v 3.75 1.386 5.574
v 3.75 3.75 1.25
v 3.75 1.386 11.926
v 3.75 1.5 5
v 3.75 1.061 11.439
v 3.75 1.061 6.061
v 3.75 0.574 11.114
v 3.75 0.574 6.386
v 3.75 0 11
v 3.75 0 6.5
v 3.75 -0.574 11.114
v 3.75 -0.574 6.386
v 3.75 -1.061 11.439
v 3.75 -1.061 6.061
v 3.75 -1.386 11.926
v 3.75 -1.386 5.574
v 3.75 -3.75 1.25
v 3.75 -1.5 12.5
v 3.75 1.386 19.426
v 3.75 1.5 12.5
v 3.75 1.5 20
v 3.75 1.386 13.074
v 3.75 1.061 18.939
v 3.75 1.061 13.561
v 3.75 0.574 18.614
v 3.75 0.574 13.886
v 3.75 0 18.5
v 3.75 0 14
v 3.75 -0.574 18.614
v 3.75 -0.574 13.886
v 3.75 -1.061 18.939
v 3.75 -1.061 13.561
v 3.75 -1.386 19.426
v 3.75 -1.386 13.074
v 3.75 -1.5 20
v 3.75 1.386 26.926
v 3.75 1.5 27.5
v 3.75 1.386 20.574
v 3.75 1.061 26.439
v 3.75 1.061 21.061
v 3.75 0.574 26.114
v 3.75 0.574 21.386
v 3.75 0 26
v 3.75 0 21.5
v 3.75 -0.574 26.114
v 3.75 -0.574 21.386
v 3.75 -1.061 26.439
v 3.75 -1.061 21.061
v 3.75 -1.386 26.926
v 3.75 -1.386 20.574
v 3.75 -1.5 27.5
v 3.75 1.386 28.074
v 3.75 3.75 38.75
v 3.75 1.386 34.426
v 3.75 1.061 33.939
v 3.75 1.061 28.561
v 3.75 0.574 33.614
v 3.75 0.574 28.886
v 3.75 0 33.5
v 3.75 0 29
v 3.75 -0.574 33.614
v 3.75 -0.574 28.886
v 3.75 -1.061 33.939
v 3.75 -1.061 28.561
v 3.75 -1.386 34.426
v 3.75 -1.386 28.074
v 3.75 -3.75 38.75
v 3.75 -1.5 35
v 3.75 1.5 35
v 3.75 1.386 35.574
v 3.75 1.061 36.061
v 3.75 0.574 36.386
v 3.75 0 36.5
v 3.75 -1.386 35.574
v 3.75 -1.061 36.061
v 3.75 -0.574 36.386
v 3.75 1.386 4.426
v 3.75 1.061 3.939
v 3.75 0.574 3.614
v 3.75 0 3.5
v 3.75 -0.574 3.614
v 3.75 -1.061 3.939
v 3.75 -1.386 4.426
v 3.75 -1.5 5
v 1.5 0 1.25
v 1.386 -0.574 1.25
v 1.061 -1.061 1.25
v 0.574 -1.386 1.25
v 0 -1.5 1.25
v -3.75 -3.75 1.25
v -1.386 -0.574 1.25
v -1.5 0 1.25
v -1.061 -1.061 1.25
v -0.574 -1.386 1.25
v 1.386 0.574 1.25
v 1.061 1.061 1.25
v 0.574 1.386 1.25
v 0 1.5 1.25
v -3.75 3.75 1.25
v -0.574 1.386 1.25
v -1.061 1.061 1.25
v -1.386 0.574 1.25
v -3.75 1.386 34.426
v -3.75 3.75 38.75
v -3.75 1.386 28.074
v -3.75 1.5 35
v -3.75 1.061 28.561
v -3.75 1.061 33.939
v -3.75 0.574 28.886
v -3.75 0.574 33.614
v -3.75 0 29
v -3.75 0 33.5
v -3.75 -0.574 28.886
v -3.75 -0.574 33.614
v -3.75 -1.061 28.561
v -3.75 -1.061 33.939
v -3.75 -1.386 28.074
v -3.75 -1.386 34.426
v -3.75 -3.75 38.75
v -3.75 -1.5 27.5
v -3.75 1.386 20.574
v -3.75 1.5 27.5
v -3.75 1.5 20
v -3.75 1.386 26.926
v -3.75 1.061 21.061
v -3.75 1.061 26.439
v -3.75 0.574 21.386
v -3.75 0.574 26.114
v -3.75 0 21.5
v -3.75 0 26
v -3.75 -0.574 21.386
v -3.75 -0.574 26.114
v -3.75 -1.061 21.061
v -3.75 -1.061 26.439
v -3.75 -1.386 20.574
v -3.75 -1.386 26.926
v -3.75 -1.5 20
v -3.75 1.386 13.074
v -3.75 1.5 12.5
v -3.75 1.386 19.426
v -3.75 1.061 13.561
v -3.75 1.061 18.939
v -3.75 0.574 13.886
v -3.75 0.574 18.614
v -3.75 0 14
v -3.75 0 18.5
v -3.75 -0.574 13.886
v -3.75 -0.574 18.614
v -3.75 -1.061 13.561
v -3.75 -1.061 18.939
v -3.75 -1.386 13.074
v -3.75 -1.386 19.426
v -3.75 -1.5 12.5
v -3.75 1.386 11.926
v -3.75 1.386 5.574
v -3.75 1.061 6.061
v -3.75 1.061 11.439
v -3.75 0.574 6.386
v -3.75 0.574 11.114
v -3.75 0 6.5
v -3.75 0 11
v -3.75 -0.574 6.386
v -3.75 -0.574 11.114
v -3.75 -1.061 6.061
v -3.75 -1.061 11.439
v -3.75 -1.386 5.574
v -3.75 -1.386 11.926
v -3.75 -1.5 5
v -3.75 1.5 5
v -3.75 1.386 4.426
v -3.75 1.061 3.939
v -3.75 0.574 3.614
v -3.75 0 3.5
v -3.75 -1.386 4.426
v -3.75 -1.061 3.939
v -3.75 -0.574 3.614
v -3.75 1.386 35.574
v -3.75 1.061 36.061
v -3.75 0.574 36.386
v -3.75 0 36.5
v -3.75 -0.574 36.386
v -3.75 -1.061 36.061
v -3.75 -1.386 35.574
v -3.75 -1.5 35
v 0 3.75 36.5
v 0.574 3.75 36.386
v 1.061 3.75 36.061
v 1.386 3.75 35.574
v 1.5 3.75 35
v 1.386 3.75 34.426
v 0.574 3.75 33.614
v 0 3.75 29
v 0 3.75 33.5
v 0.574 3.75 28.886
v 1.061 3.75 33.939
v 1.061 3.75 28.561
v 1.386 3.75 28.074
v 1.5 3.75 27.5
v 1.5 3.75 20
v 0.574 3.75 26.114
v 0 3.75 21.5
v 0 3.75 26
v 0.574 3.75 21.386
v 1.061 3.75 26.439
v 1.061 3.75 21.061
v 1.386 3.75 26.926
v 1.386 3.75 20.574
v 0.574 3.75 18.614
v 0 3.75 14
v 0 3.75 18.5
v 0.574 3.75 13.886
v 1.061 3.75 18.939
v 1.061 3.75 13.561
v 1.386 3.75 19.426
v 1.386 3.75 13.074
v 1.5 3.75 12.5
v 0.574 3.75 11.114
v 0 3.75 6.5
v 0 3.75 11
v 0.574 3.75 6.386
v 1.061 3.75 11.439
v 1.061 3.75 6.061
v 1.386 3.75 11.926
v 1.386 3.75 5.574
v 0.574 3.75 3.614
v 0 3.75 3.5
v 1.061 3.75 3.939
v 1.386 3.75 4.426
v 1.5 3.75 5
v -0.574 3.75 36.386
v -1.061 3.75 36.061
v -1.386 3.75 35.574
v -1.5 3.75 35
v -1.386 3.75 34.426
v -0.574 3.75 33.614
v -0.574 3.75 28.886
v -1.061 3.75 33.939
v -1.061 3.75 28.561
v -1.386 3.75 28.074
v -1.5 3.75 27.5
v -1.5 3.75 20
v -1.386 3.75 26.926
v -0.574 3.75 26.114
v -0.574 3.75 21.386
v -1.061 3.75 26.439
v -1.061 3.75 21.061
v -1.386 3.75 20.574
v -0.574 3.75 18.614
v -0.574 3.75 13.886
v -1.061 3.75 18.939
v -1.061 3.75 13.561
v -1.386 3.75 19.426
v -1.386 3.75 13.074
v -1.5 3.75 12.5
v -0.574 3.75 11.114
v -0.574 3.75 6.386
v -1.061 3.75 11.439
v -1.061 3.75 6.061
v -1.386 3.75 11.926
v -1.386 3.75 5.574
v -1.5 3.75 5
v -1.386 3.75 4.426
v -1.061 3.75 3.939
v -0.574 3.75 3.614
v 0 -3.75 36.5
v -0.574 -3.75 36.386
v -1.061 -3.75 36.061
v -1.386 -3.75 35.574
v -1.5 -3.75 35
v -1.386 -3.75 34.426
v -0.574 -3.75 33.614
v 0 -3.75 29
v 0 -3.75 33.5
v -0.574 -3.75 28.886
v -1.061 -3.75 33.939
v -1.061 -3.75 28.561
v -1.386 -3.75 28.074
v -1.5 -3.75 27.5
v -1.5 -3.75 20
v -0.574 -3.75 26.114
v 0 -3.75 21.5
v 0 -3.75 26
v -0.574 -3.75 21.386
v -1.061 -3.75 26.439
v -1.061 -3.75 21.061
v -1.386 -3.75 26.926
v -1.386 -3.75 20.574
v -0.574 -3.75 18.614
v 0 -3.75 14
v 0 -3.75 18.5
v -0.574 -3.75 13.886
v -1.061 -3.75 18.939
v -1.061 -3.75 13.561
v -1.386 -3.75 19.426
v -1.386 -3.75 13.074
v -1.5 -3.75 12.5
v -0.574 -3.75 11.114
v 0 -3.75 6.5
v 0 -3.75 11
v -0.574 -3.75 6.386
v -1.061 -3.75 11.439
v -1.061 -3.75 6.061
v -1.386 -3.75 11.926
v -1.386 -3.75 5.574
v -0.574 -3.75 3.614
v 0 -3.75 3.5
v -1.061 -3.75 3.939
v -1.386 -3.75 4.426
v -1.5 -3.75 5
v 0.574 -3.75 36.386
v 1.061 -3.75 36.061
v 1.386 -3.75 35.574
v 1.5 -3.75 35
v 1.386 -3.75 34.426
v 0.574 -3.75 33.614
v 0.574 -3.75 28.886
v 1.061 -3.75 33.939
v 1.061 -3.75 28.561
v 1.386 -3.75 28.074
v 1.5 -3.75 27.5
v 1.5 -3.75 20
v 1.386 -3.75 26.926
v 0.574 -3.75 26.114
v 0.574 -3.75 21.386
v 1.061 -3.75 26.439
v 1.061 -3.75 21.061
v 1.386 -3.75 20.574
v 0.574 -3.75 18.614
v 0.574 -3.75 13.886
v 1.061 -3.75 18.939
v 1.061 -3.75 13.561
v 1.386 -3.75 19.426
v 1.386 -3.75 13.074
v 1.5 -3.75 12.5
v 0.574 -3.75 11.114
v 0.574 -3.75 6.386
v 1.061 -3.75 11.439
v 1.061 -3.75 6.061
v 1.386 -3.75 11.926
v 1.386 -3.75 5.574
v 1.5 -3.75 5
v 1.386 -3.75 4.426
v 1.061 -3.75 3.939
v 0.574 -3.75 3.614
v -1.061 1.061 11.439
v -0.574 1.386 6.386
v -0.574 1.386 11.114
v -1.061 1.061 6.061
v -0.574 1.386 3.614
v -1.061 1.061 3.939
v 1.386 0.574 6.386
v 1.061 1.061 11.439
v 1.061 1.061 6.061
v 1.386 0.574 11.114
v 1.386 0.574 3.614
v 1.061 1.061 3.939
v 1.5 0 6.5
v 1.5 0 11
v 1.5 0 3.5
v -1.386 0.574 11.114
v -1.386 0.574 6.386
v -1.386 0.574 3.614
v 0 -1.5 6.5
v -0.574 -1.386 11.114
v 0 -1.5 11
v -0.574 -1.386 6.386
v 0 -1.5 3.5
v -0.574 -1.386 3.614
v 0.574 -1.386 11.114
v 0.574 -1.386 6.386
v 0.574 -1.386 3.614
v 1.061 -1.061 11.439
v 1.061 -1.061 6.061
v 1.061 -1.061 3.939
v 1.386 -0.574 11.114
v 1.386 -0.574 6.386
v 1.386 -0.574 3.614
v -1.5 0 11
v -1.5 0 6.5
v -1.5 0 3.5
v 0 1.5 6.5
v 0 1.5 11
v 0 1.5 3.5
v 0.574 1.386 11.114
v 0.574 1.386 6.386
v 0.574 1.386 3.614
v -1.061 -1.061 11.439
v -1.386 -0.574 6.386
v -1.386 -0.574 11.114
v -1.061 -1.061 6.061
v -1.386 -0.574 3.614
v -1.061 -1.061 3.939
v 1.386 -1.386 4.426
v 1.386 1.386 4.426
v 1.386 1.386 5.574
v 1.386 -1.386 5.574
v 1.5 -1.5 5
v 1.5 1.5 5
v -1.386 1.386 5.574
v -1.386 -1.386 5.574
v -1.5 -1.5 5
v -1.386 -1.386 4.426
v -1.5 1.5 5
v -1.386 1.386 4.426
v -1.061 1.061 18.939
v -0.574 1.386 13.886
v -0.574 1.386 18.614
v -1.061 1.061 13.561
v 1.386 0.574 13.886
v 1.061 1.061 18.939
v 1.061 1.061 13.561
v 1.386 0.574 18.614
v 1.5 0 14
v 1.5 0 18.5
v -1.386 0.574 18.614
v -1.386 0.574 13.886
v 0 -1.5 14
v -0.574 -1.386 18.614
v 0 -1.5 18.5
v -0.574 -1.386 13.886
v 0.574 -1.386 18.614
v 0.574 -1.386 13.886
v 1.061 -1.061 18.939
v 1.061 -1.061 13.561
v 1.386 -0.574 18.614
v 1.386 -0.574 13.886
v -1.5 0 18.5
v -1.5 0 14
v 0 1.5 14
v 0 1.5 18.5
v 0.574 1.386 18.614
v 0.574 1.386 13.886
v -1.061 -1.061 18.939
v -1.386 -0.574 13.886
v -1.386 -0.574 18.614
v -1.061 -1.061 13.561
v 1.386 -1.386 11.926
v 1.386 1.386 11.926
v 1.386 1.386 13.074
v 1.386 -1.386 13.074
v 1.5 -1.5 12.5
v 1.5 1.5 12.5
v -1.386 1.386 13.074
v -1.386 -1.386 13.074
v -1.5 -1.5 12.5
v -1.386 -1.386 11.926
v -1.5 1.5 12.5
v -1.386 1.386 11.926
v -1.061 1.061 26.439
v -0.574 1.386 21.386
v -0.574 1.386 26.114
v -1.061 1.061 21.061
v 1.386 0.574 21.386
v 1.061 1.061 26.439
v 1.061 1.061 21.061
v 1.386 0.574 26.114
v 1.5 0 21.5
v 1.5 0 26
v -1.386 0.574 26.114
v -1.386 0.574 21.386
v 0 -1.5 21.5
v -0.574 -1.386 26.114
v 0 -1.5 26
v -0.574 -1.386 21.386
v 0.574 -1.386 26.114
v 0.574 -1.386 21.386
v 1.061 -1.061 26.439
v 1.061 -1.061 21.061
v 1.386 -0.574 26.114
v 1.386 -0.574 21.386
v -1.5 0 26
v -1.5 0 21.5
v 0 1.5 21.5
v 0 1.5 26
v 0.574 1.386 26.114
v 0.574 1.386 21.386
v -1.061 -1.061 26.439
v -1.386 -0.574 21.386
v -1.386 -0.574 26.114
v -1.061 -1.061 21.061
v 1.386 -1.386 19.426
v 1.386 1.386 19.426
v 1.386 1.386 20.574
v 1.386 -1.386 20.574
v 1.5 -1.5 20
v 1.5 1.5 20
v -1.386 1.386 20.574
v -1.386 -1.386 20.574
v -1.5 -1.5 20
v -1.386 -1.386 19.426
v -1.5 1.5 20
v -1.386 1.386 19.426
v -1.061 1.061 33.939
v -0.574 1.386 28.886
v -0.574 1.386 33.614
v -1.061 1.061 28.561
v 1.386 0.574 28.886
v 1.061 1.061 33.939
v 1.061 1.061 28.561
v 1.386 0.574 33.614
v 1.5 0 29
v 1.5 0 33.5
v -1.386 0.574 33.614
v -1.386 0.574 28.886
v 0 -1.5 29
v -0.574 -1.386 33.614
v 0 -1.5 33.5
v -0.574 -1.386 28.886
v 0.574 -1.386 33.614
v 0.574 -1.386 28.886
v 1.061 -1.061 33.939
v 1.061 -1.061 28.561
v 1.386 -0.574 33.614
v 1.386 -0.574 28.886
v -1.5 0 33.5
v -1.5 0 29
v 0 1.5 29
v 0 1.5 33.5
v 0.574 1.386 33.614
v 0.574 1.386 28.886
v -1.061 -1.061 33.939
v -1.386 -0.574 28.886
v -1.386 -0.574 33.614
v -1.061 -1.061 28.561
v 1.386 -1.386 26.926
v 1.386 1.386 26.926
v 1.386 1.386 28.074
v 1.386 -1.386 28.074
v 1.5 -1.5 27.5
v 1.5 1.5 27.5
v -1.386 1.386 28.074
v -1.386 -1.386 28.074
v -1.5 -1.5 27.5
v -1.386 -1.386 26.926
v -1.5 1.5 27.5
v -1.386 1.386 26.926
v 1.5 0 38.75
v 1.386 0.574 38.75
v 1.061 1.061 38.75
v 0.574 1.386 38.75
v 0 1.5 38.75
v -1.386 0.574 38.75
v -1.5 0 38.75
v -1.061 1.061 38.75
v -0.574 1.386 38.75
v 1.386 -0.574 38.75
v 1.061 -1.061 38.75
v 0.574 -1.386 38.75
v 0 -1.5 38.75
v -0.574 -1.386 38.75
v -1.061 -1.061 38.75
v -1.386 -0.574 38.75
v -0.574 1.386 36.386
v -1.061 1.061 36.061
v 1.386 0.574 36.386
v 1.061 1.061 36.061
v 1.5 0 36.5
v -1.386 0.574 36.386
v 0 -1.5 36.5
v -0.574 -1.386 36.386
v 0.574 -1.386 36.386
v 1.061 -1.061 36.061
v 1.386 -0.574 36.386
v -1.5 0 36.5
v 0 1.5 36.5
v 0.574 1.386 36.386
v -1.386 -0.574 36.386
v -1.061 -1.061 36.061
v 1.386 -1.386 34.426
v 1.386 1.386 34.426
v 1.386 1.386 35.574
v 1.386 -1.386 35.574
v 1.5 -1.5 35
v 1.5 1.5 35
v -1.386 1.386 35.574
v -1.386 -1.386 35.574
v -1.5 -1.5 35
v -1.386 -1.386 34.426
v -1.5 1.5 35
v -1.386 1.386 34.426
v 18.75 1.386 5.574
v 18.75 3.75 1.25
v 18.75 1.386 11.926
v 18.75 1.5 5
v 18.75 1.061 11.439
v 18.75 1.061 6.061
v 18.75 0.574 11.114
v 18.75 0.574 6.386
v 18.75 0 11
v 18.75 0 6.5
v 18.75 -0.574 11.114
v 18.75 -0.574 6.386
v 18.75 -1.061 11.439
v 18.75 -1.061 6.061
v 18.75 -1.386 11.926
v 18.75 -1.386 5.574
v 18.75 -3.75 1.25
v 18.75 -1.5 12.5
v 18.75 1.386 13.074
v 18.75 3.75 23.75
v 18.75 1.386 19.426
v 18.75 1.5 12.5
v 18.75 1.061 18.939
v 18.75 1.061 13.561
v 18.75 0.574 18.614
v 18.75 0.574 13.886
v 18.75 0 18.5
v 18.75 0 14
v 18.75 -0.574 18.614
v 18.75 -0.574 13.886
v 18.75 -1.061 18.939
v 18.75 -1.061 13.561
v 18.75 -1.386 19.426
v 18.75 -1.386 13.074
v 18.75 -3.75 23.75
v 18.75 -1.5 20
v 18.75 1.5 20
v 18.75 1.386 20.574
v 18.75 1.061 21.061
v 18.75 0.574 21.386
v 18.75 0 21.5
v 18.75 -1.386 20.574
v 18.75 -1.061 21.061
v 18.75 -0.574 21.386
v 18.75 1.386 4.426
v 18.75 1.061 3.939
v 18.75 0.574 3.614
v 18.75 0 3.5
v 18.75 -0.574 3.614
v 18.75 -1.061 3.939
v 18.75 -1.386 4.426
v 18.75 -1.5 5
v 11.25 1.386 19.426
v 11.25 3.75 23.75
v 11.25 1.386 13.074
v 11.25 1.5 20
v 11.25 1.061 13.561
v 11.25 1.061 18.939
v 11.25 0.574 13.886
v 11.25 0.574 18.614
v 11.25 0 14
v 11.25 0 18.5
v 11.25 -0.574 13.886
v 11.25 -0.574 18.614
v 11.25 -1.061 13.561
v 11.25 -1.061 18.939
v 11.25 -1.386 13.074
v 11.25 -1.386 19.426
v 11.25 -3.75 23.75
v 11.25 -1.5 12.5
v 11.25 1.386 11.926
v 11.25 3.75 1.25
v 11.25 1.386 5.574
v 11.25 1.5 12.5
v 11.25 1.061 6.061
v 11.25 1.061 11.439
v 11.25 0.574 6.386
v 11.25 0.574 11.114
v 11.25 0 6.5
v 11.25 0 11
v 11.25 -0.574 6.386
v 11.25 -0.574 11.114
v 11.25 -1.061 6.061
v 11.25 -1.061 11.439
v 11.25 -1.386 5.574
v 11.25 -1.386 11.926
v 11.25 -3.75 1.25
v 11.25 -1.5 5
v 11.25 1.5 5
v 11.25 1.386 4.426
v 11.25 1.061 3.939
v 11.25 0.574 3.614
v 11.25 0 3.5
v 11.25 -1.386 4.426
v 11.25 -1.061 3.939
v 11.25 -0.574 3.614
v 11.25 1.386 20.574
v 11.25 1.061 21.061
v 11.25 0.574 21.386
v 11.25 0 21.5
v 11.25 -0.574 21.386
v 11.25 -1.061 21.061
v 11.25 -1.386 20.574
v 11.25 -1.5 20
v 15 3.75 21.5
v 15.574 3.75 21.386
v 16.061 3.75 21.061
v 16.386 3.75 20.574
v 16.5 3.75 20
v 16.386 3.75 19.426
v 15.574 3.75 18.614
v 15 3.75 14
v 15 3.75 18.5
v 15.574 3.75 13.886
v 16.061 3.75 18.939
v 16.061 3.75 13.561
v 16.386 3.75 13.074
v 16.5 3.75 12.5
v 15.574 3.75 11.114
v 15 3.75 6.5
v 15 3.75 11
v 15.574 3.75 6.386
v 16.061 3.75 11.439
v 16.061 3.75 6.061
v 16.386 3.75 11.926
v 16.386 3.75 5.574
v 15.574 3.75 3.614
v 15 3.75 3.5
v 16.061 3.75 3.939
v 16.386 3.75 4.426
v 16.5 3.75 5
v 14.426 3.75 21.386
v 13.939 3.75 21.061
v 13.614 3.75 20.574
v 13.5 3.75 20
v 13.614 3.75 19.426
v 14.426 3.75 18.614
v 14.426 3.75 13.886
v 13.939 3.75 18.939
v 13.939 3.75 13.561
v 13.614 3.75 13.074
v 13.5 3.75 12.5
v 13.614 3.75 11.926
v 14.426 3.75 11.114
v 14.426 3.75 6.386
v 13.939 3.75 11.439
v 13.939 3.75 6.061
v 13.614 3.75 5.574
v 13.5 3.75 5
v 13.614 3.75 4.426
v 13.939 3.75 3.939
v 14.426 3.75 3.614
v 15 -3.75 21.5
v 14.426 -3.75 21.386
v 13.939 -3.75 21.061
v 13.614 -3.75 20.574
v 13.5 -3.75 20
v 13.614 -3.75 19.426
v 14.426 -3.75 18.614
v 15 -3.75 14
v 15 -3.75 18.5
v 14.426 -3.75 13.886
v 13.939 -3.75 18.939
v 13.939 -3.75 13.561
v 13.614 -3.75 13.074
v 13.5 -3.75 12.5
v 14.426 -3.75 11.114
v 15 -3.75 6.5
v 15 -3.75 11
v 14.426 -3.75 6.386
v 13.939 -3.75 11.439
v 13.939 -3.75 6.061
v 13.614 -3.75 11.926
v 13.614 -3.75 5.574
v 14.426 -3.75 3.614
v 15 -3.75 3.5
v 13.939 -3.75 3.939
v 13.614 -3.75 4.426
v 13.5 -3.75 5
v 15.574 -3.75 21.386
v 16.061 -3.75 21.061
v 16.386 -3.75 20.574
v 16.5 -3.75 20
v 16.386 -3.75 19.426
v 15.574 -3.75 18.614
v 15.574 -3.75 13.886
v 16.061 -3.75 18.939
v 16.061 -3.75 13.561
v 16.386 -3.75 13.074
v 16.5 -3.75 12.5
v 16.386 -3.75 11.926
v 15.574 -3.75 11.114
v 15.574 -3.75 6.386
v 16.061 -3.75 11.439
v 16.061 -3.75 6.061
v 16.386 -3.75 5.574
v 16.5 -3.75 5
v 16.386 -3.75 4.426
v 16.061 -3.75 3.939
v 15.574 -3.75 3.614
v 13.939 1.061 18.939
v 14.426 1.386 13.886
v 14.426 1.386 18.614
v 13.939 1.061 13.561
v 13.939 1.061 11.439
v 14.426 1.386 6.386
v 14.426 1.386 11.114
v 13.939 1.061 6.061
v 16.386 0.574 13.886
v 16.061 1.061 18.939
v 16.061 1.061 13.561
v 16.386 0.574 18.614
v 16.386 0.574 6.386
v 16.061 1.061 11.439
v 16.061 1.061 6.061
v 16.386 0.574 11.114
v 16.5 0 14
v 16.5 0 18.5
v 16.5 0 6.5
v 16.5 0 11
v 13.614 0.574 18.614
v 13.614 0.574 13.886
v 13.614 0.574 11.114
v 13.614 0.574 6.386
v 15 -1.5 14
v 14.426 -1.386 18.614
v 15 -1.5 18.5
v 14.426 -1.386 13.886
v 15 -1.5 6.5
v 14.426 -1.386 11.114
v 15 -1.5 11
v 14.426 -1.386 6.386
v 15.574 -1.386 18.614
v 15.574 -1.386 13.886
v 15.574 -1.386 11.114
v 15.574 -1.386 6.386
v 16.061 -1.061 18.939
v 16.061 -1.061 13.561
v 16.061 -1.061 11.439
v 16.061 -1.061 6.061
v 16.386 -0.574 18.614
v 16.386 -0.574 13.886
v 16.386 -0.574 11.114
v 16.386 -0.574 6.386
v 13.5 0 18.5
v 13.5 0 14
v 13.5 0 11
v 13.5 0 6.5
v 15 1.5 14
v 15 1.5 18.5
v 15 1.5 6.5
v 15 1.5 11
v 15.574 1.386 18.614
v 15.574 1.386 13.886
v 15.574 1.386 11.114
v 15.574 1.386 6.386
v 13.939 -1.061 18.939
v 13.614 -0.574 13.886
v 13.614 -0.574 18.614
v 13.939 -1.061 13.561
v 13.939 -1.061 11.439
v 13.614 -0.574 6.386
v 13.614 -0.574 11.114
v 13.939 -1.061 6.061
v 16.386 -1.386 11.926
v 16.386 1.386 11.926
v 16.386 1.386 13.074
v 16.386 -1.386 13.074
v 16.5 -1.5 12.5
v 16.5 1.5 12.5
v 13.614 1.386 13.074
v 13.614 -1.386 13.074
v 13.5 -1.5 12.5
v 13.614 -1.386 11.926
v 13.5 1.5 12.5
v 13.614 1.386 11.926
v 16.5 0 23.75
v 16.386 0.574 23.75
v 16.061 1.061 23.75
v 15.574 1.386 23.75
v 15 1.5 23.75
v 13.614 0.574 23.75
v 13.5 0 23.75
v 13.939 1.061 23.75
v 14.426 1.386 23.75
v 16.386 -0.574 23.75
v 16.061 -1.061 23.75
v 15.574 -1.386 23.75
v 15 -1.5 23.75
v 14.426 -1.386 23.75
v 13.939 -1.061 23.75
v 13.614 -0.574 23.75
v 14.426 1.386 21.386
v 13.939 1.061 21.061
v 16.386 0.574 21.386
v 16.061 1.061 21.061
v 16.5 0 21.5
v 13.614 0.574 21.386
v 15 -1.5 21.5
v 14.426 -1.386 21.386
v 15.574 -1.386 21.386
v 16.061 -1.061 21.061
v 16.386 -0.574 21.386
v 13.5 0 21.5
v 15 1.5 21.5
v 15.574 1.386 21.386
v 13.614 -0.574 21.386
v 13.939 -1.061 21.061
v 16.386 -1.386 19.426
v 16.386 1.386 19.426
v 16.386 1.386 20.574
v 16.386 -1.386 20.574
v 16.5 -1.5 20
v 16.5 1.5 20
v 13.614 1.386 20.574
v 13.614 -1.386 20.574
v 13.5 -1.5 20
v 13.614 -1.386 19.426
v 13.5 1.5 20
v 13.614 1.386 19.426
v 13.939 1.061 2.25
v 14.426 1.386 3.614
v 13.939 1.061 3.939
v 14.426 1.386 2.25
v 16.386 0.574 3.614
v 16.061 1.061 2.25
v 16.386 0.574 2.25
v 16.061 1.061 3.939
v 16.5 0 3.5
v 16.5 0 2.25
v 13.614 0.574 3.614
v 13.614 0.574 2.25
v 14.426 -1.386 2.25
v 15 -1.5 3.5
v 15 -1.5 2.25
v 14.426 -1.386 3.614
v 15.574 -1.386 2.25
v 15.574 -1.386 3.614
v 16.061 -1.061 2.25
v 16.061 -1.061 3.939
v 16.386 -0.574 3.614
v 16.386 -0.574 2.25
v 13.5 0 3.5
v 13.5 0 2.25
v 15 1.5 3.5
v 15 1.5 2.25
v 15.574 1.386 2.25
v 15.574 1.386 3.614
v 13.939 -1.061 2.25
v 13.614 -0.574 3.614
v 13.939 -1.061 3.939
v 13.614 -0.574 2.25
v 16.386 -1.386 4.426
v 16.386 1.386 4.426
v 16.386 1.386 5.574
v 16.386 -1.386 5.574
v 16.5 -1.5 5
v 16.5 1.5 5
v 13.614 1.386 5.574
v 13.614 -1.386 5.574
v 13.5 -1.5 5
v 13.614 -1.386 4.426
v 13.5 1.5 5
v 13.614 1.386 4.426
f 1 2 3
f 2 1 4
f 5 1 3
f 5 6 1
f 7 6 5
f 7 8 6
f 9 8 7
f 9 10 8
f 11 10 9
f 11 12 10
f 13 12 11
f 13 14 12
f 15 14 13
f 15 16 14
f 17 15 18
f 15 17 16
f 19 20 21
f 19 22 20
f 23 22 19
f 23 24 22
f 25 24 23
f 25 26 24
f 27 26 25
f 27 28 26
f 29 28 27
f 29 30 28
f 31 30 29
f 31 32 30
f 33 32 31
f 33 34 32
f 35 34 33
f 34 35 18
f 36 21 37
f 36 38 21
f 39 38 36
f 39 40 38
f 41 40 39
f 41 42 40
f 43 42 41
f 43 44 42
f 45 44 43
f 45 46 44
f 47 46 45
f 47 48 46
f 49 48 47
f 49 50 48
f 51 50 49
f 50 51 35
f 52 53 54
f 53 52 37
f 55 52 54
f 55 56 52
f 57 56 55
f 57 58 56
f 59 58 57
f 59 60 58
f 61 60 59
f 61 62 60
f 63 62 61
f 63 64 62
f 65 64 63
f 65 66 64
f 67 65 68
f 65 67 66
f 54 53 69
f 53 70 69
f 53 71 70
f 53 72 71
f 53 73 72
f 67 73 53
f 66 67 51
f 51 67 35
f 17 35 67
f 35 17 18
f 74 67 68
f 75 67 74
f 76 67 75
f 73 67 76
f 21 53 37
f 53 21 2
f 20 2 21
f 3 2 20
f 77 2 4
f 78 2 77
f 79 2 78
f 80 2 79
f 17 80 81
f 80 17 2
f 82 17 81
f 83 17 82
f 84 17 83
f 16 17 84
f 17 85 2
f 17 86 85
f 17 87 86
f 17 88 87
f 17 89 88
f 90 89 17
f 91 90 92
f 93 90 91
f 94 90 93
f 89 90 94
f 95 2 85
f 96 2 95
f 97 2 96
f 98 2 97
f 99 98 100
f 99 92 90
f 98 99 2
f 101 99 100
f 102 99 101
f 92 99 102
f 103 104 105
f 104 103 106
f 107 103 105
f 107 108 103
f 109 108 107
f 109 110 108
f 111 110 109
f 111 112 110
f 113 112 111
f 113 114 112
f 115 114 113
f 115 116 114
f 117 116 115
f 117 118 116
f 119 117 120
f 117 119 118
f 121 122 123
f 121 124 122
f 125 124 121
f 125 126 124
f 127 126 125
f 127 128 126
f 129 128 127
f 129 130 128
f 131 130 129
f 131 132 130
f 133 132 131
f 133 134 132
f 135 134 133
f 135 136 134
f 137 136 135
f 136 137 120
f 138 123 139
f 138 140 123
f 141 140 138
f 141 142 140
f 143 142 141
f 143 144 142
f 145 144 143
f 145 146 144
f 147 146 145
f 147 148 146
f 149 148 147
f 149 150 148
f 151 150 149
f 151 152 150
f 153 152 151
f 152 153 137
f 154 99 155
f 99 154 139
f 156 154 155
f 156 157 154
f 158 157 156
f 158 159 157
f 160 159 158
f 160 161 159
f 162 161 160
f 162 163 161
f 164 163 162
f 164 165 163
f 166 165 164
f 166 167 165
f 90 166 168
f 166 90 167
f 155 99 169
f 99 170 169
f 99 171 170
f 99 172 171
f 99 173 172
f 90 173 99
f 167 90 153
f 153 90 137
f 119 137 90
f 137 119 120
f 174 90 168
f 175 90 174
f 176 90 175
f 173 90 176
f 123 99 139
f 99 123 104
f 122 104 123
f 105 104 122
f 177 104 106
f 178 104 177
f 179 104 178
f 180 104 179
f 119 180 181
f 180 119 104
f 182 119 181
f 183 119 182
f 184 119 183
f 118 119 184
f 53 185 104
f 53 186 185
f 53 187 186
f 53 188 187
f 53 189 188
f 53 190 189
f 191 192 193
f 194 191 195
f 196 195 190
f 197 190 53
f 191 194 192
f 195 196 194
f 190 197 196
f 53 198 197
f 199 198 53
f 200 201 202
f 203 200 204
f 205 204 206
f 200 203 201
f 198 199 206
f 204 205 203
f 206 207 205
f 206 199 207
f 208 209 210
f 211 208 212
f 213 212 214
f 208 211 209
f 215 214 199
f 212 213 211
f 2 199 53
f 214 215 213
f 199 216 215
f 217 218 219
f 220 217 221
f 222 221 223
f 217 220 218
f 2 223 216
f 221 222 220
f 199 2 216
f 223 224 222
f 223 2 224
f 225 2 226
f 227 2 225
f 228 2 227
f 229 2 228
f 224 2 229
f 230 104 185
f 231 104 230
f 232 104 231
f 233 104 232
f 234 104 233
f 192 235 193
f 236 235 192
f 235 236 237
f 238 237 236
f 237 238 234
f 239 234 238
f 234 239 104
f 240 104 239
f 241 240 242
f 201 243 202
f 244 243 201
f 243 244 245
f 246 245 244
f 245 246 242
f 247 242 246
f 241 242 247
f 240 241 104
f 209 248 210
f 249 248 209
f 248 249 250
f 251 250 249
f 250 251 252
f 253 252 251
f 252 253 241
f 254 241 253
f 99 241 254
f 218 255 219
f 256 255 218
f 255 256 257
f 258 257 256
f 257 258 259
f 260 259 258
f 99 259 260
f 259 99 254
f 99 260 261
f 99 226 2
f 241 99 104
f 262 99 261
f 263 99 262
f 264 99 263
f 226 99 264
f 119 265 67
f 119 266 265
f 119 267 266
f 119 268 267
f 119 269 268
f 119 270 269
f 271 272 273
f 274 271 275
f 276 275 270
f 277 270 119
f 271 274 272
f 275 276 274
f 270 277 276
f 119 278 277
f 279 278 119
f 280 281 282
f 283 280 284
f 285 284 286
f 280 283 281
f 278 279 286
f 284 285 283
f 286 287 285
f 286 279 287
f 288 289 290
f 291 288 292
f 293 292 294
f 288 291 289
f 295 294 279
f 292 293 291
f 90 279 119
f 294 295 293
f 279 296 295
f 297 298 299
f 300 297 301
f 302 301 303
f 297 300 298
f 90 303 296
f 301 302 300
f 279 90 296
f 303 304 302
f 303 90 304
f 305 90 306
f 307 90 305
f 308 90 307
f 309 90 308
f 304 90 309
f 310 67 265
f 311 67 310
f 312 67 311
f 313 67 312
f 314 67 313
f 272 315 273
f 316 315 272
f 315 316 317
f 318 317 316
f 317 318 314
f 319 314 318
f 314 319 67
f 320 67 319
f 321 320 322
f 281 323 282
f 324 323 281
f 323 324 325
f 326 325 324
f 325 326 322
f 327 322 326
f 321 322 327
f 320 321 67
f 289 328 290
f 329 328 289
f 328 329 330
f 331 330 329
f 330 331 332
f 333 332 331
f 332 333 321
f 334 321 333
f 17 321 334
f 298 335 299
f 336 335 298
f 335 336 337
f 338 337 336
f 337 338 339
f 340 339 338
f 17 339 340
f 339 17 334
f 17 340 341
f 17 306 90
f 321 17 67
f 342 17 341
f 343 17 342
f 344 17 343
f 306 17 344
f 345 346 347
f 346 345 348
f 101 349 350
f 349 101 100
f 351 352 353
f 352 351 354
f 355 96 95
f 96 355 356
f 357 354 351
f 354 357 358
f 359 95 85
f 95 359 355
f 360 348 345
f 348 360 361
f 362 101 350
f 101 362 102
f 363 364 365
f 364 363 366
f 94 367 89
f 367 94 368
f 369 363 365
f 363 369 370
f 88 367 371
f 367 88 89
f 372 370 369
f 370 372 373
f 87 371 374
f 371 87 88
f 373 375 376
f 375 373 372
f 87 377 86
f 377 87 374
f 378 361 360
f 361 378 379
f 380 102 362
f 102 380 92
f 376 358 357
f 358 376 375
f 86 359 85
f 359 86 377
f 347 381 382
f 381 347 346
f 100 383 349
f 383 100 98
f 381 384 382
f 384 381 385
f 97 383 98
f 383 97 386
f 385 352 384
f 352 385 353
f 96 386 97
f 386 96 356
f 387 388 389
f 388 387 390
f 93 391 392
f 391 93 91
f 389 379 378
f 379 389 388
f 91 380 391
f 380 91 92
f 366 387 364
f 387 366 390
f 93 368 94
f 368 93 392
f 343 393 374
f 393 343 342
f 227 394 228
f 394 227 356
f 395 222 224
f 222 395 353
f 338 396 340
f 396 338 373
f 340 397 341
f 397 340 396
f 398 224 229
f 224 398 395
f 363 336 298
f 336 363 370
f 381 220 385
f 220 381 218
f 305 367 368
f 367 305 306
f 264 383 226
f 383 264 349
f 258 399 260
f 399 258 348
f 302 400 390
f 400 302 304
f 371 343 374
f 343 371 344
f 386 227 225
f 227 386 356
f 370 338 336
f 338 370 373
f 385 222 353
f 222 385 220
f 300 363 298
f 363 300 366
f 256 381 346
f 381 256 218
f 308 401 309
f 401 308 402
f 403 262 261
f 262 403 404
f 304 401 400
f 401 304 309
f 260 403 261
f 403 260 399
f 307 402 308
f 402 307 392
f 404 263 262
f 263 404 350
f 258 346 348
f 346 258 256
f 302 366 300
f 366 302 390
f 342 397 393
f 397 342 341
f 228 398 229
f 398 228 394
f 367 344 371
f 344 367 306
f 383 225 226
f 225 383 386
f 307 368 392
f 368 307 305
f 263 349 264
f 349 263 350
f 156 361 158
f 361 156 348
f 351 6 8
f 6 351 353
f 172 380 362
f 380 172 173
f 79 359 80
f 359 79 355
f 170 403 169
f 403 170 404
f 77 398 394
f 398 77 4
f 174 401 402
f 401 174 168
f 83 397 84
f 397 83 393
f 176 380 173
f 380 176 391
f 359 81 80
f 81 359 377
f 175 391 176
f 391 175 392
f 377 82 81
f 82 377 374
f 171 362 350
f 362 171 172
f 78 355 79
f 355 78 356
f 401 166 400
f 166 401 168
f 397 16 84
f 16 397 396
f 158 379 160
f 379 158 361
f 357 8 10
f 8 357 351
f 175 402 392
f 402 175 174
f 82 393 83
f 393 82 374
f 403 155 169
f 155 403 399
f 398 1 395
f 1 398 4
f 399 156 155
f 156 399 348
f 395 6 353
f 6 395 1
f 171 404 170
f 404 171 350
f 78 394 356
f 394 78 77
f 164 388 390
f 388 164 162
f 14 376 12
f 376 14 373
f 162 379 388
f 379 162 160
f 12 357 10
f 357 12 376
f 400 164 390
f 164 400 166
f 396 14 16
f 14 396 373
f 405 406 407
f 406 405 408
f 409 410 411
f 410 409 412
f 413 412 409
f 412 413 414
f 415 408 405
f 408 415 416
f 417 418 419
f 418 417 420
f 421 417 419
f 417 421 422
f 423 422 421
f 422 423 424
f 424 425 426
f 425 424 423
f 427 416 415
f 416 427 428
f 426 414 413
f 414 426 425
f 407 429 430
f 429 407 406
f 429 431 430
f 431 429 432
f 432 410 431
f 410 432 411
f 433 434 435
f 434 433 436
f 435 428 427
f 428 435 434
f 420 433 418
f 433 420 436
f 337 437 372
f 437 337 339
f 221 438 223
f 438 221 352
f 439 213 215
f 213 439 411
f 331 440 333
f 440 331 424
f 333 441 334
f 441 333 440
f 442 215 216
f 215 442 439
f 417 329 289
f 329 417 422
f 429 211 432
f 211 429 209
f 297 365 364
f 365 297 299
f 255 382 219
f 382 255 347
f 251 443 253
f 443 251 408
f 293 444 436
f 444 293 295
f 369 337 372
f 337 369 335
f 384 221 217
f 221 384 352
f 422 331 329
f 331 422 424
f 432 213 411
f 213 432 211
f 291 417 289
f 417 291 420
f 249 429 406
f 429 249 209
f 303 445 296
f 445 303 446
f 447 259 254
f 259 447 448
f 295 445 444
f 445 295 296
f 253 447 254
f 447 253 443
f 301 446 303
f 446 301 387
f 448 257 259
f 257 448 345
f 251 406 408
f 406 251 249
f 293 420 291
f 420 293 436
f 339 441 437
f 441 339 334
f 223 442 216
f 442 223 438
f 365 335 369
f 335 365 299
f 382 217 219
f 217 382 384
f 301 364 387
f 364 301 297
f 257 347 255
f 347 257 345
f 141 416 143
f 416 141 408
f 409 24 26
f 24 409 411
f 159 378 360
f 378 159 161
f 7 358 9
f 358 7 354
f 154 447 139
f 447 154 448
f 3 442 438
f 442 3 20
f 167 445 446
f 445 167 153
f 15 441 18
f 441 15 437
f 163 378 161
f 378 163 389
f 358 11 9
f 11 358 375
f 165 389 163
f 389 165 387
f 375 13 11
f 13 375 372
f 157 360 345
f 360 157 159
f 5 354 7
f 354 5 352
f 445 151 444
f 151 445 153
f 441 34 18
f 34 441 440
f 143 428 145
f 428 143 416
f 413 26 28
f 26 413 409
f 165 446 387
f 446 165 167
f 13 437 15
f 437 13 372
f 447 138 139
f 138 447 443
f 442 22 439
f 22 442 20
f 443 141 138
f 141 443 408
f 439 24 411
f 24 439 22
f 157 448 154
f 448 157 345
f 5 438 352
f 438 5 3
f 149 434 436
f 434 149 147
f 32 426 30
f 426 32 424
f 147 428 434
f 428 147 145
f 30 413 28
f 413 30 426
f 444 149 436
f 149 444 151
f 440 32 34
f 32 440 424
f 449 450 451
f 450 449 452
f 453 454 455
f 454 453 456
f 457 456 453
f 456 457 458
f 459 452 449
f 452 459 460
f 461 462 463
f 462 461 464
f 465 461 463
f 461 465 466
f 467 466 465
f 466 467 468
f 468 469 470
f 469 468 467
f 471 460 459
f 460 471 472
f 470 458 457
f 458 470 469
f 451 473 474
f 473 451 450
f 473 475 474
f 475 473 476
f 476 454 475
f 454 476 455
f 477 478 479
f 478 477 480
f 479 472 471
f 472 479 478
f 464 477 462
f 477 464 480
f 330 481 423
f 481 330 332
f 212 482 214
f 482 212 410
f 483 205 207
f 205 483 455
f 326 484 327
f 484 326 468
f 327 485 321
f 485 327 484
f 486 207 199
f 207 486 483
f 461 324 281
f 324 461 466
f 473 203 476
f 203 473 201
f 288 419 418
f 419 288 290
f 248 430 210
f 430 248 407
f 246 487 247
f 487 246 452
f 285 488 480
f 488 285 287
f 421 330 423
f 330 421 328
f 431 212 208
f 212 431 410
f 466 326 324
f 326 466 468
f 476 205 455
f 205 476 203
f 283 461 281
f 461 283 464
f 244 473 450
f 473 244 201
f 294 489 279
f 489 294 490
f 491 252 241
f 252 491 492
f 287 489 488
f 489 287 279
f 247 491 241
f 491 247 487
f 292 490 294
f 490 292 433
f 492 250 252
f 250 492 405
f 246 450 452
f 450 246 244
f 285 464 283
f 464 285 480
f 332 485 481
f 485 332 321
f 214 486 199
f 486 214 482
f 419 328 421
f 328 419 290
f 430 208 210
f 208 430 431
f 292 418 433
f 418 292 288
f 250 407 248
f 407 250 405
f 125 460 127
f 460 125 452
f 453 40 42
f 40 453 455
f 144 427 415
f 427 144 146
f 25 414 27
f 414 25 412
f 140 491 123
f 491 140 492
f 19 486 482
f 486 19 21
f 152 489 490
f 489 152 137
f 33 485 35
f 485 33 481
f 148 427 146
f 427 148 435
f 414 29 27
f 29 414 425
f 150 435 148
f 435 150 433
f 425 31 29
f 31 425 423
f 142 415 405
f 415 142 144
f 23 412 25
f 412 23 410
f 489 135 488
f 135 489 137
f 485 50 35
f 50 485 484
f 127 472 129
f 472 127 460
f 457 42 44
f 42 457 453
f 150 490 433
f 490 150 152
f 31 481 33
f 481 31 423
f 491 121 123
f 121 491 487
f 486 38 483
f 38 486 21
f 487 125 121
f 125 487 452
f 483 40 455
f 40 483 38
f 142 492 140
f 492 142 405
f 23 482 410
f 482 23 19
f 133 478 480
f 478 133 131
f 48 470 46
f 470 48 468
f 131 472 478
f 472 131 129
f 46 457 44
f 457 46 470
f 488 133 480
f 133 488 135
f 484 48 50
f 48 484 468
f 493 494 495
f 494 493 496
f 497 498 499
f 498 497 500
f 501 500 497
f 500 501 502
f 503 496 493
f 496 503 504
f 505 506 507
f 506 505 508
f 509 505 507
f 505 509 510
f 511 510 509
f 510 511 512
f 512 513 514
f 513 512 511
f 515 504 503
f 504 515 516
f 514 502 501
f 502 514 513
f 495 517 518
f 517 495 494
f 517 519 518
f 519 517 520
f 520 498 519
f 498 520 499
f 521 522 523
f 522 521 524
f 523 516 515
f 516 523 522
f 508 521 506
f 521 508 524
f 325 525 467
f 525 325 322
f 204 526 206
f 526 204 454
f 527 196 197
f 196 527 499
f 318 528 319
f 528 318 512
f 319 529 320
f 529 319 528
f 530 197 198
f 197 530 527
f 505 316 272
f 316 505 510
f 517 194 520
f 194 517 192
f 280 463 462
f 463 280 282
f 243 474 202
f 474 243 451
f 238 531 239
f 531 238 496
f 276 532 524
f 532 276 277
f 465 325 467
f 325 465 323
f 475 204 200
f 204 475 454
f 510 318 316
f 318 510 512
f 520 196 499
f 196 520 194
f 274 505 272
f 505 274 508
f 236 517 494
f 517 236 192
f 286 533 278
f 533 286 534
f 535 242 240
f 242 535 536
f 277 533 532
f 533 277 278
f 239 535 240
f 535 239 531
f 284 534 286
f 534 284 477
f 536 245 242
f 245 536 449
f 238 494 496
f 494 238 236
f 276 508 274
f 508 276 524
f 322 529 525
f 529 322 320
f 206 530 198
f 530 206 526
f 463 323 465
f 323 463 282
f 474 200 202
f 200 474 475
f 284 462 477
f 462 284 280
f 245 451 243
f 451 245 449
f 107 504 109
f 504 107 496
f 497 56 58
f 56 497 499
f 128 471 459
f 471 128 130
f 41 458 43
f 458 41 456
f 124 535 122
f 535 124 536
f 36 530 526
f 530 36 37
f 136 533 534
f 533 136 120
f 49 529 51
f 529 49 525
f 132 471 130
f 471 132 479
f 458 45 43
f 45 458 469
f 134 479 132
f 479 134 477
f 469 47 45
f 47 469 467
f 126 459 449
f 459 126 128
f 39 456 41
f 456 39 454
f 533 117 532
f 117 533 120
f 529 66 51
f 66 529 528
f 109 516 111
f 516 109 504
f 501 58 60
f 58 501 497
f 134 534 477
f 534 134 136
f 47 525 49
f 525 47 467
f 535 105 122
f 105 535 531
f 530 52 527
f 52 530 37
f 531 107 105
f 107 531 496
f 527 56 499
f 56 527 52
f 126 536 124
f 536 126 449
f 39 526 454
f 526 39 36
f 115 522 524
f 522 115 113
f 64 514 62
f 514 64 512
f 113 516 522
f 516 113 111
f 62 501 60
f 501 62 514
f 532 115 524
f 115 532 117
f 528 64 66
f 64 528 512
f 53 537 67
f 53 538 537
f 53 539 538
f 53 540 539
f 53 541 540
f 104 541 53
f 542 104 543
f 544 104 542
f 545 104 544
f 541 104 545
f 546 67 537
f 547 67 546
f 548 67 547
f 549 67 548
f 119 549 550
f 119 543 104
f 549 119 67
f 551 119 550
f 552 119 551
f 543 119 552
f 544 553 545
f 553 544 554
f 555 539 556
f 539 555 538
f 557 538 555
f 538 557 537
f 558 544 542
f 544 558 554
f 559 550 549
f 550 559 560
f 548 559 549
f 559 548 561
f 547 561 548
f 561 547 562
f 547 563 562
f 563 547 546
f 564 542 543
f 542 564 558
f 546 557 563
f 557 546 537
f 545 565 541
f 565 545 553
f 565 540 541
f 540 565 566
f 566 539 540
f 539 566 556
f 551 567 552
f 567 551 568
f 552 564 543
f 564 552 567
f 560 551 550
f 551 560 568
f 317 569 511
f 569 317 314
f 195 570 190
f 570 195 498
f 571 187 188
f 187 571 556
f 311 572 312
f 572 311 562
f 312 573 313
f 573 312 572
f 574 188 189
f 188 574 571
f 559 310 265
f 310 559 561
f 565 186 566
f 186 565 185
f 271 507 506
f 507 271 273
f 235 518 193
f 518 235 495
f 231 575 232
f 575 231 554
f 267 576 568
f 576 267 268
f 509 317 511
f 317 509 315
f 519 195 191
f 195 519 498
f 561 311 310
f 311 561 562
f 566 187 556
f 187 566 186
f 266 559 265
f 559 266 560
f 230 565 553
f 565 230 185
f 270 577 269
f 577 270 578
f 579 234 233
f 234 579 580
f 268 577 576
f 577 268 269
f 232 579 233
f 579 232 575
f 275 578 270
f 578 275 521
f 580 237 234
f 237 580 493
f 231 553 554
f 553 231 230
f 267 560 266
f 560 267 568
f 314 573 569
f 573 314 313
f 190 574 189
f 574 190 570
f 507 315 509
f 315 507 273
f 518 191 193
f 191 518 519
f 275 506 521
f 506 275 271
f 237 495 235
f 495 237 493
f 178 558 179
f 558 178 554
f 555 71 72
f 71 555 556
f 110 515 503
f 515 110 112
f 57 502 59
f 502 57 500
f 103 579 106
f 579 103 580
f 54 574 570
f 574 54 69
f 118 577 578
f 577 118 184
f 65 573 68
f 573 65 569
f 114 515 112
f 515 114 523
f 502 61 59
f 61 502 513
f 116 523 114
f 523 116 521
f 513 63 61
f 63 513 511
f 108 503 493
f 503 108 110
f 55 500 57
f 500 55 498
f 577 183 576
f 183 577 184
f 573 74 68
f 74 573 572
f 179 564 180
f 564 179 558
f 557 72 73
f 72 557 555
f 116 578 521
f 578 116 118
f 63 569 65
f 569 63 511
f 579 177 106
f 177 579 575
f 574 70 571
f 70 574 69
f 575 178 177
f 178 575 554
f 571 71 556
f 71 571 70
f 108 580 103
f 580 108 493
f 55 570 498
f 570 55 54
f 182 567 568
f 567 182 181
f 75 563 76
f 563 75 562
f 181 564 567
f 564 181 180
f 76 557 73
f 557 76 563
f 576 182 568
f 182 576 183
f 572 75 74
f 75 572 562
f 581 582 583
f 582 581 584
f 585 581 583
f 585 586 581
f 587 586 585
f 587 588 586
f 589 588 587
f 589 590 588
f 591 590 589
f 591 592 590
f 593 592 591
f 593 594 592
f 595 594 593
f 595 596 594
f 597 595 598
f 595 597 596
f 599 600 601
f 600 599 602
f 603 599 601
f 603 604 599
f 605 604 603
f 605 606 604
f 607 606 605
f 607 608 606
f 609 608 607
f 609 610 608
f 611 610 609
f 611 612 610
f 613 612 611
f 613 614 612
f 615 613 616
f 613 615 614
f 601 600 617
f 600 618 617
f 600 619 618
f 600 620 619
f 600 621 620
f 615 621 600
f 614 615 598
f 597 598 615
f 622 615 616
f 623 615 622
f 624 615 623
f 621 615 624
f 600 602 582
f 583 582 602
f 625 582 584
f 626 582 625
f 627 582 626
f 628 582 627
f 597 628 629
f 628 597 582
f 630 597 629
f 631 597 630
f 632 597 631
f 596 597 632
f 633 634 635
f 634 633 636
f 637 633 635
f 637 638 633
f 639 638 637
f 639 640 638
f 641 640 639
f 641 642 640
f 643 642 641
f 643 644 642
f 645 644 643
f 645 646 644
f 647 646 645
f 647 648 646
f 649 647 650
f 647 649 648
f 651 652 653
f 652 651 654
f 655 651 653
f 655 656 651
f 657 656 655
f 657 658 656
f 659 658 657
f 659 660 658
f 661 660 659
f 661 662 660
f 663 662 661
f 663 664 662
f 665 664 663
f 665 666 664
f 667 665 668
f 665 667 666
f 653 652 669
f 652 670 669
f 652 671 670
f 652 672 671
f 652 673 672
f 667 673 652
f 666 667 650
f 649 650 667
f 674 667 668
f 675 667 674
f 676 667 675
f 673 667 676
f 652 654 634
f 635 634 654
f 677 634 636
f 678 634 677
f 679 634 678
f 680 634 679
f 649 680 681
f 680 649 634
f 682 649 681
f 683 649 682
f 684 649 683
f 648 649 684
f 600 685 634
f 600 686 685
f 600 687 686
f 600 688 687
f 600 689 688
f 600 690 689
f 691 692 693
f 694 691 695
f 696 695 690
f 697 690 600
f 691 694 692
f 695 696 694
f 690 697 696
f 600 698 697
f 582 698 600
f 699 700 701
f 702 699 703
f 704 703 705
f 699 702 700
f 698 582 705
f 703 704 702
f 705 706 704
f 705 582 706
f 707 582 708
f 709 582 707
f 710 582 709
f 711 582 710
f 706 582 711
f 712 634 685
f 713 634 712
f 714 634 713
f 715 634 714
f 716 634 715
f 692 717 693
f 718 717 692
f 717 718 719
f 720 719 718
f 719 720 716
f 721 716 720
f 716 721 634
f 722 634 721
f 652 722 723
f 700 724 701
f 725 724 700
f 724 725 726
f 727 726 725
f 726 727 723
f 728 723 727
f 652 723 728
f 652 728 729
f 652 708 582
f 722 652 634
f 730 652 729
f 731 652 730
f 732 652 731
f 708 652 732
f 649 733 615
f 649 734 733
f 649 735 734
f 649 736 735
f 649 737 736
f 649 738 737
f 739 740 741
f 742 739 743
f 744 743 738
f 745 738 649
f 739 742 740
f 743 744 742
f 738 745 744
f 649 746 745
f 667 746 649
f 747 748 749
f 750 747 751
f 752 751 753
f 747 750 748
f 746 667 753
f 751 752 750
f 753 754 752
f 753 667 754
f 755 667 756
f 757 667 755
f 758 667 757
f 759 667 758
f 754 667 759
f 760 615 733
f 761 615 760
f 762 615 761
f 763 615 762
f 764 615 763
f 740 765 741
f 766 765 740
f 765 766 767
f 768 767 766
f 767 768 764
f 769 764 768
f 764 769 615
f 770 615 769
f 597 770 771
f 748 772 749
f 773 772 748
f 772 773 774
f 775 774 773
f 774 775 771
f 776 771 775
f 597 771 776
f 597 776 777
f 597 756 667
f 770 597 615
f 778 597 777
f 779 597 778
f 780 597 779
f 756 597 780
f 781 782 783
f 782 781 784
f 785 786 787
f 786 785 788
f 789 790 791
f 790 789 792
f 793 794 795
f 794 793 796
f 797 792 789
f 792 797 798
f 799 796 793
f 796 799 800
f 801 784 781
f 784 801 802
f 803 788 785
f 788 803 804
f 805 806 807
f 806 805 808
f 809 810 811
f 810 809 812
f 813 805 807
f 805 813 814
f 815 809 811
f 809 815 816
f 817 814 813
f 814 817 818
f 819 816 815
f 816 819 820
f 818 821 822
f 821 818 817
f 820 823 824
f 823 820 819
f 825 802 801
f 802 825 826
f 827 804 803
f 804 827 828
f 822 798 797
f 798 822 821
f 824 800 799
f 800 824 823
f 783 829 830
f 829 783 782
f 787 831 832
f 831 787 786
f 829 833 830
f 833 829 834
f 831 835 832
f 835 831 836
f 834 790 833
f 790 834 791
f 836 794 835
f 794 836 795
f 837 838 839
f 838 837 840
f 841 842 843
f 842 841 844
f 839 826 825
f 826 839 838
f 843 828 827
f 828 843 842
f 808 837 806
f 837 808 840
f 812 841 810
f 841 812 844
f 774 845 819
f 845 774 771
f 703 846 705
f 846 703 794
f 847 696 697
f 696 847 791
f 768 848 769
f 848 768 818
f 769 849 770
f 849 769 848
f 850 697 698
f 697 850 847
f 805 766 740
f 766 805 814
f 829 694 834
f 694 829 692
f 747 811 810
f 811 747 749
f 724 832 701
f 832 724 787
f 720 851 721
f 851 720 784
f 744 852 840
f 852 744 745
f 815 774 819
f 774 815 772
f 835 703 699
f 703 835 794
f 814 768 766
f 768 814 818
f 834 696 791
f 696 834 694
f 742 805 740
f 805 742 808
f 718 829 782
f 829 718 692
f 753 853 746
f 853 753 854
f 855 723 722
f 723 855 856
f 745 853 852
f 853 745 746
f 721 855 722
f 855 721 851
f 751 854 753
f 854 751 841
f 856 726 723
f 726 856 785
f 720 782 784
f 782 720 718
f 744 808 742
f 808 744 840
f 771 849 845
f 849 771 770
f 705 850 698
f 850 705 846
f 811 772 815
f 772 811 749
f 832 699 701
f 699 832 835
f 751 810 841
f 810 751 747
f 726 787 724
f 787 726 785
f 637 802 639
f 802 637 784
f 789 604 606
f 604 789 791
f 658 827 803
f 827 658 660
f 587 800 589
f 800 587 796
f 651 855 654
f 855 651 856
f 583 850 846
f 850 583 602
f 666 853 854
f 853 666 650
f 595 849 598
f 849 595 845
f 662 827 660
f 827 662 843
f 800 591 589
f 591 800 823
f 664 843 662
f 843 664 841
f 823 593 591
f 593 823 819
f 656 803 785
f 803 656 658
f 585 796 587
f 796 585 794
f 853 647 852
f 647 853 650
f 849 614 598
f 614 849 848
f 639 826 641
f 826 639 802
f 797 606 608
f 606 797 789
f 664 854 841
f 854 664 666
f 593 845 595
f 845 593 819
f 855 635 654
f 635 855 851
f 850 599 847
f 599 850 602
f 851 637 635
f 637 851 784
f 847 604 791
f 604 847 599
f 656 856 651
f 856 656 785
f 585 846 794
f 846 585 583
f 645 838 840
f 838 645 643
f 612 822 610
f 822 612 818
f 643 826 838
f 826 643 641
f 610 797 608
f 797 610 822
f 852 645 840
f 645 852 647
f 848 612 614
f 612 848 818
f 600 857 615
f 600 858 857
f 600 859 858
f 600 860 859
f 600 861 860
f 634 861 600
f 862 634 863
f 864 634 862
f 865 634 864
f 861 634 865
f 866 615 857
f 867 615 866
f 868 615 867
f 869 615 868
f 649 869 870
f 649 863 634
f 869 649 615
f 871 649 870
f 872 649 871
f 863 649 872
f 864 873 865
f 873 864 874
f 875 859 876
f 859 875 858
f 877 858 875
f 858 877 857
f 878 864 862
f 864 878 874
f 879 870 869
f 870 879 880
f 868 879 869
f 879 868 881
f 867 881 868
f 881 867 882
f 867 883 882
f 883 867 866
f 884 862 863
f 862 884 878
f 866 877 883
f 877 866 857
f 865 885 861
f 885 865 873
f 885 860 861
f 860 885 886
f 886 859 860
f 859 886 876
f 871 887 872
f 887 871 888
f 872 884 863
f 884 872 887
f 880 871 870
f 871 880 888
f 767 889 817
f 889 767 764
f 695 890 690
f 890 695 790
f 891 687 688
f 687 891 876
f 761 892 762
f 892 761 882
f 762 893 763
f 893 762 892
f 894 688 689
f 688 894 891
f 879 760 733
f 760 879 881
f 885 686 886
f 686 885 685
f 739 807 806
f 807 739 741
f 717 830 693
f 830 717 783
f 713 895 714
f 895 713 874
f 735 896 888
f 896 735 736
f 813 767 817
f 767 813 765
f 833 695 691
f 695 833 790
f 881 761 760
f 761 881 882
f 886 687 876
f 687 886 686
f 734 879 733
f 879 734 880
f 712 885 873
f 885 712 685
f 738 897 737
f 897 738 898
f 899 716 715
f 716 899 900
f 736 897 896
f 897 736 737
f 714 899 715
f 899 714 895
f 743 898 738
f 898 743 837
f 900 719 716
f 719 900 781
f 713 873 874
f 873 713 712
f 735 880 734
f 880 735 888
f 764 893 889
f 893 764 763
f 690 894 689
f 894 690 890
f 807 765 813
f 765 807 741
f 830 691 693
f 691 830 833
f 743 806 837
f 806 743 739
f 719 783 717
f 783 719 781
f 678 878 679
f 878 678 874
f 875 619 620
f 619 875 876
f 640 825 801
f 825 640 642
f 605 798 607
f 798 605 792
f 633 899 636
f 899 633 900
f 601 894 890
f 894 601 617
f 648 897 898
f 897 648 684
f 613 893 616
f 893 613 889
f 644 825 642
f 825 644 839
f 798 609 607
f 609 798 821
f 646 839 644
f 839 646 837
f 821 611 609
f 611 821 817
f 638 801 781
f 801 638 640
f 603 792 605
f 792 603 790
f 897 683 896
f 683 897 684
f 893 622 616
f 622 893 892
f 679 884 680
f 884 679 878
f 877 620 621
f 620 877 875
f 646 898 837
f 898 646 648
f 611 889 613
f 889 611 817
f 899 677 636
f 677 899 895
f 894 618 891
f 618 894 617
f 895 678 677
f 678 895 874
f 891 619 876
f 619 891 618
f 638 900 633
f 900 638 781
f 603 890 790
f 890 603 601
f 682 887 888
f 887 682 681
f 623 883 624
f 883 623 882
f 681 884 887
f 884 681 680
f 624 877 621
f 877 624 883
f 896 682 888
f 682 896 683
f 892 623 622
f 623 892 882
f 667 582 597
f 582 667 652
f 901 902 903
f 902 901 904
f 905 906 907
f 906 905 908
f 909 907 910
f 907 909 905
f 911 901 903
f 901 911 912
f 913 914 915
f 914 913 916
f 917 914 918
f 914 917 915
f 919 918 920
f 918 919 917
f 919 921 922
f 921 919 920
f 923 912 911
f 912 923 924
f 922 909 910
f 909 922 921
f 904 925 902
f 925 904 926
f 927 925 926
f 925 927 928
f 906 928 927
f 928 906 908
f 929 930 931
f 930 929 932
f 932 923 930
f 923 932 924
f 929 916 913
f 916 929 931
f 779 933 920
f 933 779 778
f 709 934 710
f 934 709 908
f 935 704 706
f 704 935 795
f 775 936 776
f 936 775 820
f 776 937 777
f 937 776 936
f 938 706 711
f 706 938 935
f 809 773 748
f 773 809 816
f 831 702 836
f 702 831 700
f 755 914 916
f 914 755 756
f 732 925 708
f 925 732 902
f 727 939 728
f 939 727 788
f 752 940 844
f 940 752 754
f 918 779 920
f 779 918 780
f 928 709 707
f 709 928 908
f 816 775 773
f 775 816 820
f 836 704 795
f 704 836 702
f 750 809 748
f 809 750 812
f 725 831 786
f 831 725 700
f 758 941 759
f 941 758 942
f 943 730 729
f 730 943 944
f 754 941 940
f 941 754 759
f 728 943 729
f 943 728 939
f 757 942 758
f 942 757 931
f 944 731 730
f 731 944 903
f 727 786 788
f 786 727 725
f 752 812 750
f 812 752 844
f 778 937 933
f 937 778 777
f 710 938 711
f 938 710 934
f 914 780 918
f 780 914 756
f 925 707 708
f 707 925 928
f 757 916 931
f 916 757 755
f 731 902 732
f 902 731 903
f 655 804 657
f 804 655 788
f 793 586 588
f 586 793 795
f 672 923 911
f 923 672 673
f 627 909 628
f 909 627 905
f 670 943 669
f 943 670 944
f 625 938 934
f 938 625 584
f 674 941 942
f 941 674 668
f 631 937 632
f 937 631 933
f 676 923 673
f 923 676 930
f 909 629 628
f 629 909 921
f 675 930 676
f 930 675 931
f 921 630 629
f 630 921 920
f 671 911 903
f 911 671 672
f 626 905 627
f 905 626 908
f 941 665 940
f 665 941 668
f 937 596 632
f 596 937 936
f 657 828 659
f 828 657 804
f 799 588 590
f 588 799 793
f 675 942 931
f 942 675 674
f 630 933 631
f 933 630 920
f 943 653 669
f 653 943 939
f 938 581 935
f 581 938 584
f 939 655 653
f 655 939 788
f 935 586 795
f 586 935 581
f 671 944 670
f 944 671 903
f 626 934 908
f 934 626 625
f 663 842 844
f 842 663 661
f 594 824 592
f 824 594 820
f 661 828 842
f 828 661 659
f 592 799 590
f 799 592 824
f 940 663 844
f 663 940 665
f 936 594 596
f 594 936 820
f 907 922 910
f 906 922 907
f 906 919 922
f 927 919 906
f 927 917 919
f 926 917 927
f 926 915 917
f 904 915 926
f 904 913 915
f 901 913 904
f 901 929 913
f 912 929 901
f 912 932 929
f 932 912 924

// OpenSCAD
use <../nscad-lib.scad>

color("orange") balkenZ(5);
color("steelblue") move(15) balkenZ(3, boden = 1);
